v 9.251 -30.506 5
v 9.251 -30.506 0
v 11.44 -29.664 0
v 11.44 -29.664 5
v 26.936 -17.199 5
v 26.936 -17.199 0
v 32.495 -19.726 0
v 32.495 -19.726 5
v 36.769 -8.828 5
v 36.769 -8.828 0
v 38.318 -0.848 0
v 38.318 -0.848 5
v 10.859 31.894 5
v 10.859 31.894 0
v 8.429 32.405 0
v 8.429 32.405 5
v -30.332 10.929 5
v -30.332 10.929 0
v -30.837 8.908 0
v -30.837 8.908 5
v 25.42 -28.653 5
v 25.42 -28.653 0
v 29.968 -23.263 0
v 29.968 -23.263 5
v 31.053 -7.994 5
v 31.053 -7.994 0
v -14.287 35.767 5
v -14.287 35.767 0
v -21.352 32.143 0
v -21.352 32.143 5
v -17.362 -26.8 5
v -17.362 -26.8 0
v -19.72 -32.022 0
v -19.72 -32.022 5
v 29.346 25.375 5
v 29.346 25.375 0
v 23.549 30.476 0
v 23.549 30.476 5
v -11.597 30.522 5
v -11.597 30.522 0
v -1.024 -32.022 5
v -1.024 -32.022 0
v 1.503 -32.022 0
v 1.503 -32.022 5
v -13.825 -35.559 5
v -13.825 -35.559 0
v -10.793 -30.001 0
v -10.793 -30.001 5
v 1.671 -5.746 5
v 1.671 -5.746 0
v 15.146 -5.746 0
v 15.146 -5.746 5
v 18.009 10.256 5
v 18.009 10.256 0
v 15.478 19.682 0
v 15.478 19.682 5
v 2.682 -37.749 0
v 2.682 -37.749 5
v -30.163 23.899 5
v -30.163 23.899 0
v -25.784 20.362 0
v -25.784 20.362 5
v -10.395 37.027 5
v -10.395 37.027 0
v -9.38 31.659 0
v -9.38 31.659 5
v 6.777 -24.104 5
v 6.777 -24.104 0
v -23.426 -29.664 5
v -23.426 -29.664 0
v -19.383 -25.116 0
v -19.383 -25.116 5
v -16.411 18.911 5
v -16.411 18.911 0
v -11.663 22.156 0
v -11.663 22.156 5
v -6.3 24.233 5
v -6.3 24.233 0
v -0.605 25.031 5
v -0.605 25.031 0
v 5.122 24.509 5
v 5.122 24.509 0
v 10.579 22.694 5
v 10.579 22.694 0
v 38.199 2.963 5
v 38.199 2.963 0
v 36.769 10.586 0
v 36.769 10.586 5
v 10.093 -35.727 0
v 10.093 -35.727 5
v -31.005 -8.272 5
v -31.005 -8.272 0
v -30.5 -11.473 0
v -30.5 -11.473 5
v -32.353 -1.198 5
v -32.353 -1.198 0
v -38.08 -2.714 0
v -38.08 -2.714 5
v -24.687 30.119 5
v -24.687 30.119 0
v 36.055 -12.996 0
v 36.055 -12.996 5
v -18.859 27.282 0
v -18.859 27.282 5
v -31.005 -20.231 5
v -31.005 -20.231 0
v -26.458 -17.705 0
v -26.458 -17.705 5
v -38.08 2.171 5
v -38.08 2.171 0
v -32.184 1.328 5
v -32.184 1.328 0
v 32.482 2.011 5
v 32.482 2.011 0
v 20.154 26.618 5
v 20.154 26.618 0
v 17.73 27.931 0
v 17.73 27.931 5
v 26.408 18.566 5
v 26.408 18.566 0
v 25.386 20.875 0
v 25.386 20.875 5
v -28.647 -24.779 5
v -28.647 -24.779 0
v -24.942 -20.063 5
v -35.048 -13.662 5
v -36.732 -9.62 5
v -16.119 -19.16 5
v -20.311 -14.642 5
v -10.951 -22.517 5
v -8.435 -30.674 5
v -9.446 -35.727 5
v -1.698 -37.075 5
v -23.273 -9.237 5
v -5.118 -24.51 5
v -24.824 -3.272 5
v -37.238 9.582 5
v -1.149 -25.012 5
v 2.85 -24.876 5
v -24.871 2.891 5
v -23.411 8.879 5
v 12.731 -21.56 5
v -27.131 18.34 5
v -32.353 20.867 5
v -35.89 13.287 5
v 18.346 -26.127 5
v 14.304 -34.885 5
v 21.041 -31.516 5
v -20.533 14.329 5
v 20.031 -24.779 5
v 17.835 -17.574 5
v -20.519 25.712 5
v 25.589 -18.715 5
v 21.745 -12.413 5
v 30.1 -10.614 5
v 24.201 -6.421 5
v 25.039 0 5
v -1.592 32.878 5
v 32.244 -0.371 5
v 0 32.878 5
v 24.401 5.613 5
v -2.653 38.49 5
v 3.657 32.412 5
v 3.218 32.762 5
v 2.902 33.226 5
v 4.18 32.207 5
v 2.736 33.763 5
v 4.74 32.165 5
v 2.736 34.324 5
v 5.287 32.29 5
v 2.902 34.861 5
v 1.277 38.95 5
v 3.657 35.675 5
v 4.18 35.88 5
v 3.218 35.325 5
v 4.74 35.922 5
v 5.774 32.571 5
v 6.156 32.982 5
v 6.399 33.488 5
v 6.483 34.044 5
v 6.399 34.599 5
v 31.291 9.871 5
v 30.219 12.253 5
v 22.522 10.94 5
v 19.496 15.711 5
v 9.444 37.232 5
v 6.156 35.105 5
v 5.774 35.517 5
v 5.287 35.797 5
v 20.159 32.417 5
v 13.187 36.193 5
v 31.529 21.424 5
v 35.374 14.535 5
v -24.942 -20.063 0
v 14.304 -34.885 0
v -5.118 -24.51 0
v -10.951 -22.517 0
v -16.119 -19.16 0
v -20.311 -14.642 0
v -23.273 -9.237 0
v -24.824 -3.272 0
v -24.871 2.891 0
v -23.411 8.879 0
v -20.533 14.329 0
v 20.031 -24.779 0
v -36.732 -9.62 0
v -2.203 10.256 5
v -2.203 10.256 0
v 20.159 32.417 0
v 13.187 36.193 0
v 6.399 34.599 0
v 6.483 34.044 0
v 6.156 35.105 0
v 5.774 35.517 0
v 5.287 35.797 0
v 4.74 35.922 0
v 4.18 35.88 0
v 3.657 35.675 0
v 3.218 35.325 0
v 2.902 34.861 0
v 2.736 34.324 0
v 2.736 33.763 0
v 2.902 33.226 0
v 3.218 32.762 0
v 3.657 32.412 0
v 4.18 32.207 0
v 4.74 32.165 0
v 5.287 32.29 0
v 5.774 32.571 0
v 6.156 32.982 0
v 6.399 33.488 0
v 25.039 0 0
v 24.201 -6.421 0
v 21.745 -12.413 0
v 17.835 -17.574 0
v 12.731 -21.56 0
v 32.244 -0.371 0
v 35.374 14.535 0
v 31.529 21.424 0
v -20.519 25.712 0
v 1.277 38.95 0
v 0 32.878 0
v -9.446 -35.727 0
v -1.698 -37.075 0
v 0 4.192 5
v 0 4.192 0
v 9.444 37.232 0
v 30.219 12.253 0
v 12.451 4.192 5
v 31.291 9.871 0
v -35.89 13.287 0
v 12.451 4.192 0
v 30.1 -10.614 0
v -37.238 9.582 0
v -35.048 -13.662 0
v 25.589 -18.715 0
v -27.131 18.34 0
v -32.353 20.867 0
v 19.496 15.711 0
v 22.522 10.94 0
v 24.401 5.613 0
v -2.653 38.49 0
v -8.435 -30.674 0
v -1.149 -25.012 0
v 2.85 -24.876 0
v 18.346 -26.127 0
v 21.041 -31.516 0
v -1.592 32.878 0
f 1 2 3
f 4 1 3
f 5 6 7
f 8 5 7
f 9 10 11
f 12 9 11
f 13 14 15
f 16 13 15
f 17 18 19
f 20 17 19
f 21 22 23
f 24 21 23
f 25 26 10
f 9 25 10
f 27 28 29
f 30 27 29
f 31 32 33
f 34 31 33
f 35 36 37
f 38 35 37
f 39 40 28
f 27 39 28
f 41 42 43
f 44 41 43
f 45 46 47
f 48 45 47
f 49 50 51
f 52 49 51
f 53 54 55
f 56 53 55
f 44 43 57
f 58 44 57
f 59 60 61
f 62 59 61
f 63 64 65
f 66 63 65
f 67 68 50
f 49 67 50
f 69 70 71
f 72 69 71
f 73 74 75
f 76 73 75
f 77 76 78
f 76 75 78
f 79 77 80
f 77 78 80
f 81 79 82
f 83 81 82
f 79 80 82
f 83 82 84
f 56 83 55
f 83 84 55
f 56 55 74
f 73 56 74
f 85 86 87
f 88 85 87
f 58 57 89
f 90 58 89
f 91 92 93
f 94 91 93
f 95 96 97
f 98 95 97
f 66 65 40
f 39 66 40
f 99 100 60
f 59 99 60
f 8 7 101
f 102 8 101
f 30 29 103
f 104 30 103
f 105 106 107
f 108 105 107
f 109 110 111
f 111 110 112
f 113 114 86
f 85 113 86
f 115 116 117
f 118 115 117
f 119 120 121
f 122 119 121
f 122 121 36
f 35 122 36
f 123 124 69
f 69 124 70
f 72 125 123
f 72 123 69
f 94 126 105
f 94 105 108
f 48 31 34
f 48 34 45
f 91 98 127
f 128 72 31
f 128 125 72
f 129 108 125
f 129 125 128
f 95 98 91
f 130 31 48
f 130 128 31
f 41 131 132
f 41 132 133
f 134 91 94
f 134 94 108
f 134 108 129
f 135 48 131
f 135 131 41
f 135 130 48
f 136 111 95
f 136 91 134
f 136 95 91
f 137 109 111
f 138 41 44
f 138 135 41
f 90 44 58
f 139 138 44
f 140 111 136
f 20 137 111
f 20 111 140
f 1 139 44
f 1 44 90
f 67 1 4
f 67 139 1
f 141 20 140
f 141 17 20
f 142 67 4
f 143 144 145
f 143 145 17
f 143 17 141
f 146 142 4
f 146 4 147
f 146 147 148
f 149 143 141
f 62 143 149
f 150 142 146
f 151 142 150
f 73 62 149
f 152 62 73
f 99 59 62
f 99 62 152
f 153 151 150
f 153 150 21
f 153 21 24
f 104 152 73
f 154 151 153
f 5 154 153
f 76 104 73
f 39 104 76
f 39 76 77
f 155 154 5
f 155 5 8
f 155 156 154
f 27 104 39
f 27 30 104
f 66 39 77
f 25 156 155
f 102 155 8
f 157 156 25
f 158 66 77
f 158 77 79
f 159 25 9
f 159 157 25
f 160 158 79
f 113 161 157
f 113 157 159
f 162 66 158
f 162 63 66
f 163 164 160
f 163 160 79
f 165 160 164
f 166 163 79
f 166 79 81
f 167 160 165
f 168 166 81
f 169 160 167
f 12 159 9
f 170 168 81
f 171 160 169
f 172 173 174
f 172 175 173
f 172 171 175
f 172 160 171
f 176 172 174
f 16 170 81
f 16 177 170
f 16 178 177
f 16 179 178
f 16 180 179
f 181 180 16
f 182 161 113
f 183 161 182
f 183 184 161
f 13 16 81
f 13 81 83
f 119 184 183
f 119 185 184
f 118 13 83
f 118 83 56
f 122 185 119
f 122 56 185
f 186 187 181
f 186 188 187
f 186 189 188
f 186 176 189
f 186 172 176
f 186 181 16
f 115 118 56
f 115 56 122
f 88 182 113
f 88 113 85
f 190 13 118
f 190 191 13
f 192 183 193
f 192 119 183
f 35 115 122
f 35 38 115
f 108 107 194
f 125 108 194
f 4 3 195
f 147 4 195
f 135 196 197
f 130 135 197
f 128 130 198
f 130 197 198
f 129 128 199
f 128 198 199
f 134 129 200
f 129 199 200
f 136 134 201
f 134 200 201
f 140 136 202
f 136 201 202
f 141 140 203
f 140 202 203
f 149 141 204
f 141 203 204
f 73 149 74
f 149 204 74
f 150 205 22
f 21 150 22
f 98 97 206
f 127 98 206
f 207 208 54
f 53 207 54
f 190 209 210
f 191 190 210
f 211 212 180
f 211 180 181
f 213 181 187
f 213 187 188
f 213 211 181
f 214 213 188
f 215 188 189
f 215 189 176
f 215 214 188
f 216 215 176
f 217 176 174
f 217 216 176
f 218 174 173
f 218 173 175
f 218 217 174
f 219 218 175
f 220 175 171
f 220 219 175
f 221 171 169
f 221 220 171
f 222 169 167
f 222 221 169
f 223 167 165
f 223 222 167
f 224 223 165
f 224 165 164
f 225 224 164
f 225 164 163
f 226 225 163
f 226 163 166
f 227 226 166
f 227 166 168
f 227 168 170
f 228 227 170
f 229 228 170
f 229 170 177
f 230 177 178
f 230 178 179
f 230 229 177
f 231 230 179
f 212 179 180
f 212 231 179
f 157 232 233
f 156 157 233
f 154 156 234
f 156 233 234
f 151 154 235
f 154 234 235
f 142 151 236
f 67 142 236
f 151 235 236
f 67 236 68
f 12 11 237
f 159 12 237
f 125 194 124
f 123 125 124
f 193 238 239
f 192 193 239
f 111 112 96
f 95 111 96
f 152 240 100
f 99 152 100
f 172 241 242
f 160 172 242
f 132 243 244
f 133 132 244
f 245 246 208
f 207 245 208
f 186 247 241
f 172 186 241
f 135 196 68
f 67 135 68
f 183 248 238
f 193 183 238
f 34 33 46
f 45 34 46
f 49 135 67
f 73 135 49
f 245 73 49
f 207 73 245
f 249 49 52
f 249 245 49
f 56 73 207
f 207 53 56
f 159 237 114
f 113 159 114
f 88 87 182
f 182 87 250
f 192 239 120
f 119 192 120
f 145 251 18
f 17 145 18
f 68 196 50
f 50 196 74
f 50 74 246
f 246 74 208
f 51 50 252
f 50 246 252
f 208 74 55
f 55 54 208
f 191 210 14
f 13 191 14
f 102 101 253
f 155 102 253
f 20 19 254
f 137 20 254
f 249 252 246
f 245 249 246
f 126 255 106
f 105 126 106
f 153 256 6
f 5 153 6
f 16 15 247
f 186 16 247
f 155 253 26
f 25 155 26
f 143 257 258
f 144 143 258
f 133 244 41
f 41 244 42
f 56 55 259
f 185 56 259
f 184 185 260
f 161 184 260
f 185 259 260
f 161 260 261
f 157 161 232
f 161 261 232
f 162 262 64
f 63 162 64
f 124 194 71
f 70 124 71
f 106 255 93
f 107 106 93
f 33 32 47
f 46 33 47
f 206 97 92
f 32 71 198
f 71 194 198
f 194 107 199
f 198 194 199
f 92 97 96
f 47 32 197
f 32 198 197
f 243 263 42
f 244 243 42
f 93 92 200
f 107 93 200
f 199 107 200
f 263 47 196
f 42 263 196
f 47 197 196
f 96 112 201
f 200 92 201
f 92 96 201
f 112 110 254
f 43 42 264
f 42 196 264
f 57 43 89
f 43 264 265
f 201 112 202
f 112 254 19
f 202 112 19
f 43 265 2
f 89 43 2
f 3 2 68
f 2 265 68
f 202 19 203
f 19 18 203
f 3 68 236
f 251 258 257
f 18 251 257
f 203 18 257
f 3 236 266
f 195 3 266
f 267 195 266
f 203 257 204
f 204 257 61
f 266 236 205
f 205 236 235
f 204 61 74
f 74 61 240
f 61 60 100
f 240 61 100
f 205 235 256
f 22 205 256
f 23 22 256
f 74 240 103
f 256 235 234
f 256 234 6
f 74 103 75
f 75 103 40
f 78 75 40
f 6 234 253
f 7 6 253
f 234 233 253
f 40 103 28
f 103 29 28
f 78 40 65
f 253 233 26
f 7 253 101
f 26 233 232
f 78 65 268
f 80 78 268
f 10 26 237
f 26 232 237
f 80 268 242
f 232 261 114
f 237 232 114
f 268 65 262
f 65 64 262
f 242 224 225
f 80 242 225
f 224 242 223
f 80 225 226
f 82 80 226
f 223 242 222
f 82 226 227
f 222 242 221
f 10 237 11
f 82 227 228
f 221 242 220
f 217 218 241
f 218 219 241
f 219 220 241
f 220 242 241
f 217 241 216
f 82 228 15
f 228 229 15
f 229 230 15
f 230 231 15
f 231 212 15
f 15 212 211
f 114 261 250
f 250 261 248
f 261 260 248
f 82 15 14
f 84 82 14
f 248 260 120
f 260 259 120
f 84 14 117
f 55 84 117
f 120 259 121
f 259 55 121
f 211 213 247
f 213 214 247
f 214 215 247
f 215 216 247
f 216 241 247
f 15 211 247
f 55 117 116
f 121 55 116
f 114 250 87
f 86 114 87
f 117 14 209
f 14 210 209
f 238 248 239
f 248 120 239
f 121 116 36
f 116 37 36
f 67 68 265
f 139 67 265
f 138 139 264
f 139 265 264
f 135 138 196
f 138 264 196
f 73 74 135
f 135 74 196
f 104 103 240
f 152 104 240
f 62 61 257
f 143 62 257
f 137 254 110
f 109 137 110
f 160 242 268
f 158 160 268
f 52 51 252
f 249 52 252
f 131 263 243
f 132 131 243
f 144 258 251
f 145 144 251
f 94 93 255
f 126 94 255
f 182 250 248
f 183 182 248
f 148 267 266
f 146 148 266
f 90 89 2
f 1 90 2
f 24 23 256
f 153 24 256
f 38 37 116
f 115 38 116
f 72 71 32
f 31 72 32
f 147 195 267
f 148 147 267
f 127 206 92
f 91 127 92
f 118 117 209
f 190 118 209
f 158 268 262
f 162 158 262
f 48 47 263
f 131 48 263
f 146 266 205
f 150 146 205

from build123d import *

# Parameters (mm, degrees)
F0_R     = 1.884031
F1_DEPTH = 5


with BuildPart() as f1:
    # F0 (on Top) → F1 (new body)
    with BuildSketch(Plane.XY):
        Polygon((-20.51856, 25.711885), (-24.687123, 30.11865), (-30.163238, 23.898786), (-25.783919, 20.361641), (-27.131403, 18.340418), (-32.352898, 20.866947), (-35.890043, 13.287356), (-30.331675, 10.929262), (-30.836981, 8.908037), (-37.237525, 9.581779), (-38.079701, 2.170623), (-32.184463, 1.328446), (-32.352898, -1.198084), (-38.079701, -2.714003), (-36.732219, -9.619853), (-31.005416, -8.27237), (-30.50011, -11.472641), (-35.047863, -13.662302), (-31.005416, -20.23128), (-26.45766, -17.704749), (-24.941742, -20.062845), (-28.64732, -24.779037), (-23.425825, -29.663661), (-19.383375, -25.115907), (-17.362151, -26.80026), (-19.720247, -32.021757), (-13.825009, -35.558902), (-10.793171, -30.000534), (-8.435077, -30.674273), (-9.445689, -35.727333), (-1.697662, -37.074819), (-1.023921, -32.021757), (1.502609, -32.021757), (2.681657, -37.74856), (10.092814, -35.727333), (9.250638, -30.50584), (11.440297, -29.663661), (14.303697, -34.885157), (21.041114, -31.516451), (18.346146, -26.126519), (20.030502, -24.779037), (25.420433, -28.65305), (29.968187, -23.263117), (25.588868, -18.715363), (26.93635, -17.199444), (32.494716, -19.725975), (36.05479, -12.996196), (30.099701, -10.61416), (31.052515, -7.993922), (36.769401, -8.827634), (38.317725, -0.847814), (32.243535, -0.371407), (32.481737, 2.010629), (38.19862, 2.963443), (36.769401, 10.585957), (31.290721, 9.871347), (30.218804, 12.253382), (35.373972, 14.535178), (31.528924, 21.424221), (26.407547, 18.565778), (25.385937, 20.87495), (29.345841, 25.374953), (23.5491, 30.475957), (20.154166, 26.617981), (17.729516, 27.931154), (20.15901, 32.416985), (13.187246, 36.192842), (10.85917, 31.894267), (8.429056, 32.405401), (9.444303, 37.23225), (1.277068, 38.950091), (0, 32.878451), (-1.592271, 32.878451), (-2.653307, 38.490271), (-10.394908, 37.026554), (-9.380095, 31.659206), (-11.596938, 30.522174), (-14.287113, 35.767142), (-21.352272, 32.14338), (-18.858804, 27.281925), align=None)
        with BuildLine():
            ThreePointArc((15.478202, 19.681548), (22.522129, 10.940373), (25.038732, 0))
            ThreePointArc((25.038732, 0), (19.957626, -15.120557), (6.776526, -24.104289))
            ThreePointArc((6.776526, -24.104289), (0.853488, -25.024181), (-5.118462, -24.509986))
            ThreePointArc((-5.118462, -24.509986), (-24.232658, -6.302094), (-16.41078, 18.910959))
            ThreePointArc((-16.41078, 18.910959), (-0.604878, 25.031424), (15.478202, 19.681548))
        make_face(mode=Mode.SUBTRACT)
        with Locations((4.598969, 34.043554)):
            Circle(F0_R, mode=Mode.SUBTRACT)
        Polygon((18.009275, 10.25552), (15.478202, 19.681548), (-16.41078, 18.910959), (-5.118462, -24.509986), (6.776526, -24.104289), (1.671045, -5.745839), (15.145875, -5.745839), (12.450909, 4.191847), (0, 4.191847), (-2.202968, 10.25552), align=None)
    extrude(amount=F1_DEPTH)


solid = f1.part
